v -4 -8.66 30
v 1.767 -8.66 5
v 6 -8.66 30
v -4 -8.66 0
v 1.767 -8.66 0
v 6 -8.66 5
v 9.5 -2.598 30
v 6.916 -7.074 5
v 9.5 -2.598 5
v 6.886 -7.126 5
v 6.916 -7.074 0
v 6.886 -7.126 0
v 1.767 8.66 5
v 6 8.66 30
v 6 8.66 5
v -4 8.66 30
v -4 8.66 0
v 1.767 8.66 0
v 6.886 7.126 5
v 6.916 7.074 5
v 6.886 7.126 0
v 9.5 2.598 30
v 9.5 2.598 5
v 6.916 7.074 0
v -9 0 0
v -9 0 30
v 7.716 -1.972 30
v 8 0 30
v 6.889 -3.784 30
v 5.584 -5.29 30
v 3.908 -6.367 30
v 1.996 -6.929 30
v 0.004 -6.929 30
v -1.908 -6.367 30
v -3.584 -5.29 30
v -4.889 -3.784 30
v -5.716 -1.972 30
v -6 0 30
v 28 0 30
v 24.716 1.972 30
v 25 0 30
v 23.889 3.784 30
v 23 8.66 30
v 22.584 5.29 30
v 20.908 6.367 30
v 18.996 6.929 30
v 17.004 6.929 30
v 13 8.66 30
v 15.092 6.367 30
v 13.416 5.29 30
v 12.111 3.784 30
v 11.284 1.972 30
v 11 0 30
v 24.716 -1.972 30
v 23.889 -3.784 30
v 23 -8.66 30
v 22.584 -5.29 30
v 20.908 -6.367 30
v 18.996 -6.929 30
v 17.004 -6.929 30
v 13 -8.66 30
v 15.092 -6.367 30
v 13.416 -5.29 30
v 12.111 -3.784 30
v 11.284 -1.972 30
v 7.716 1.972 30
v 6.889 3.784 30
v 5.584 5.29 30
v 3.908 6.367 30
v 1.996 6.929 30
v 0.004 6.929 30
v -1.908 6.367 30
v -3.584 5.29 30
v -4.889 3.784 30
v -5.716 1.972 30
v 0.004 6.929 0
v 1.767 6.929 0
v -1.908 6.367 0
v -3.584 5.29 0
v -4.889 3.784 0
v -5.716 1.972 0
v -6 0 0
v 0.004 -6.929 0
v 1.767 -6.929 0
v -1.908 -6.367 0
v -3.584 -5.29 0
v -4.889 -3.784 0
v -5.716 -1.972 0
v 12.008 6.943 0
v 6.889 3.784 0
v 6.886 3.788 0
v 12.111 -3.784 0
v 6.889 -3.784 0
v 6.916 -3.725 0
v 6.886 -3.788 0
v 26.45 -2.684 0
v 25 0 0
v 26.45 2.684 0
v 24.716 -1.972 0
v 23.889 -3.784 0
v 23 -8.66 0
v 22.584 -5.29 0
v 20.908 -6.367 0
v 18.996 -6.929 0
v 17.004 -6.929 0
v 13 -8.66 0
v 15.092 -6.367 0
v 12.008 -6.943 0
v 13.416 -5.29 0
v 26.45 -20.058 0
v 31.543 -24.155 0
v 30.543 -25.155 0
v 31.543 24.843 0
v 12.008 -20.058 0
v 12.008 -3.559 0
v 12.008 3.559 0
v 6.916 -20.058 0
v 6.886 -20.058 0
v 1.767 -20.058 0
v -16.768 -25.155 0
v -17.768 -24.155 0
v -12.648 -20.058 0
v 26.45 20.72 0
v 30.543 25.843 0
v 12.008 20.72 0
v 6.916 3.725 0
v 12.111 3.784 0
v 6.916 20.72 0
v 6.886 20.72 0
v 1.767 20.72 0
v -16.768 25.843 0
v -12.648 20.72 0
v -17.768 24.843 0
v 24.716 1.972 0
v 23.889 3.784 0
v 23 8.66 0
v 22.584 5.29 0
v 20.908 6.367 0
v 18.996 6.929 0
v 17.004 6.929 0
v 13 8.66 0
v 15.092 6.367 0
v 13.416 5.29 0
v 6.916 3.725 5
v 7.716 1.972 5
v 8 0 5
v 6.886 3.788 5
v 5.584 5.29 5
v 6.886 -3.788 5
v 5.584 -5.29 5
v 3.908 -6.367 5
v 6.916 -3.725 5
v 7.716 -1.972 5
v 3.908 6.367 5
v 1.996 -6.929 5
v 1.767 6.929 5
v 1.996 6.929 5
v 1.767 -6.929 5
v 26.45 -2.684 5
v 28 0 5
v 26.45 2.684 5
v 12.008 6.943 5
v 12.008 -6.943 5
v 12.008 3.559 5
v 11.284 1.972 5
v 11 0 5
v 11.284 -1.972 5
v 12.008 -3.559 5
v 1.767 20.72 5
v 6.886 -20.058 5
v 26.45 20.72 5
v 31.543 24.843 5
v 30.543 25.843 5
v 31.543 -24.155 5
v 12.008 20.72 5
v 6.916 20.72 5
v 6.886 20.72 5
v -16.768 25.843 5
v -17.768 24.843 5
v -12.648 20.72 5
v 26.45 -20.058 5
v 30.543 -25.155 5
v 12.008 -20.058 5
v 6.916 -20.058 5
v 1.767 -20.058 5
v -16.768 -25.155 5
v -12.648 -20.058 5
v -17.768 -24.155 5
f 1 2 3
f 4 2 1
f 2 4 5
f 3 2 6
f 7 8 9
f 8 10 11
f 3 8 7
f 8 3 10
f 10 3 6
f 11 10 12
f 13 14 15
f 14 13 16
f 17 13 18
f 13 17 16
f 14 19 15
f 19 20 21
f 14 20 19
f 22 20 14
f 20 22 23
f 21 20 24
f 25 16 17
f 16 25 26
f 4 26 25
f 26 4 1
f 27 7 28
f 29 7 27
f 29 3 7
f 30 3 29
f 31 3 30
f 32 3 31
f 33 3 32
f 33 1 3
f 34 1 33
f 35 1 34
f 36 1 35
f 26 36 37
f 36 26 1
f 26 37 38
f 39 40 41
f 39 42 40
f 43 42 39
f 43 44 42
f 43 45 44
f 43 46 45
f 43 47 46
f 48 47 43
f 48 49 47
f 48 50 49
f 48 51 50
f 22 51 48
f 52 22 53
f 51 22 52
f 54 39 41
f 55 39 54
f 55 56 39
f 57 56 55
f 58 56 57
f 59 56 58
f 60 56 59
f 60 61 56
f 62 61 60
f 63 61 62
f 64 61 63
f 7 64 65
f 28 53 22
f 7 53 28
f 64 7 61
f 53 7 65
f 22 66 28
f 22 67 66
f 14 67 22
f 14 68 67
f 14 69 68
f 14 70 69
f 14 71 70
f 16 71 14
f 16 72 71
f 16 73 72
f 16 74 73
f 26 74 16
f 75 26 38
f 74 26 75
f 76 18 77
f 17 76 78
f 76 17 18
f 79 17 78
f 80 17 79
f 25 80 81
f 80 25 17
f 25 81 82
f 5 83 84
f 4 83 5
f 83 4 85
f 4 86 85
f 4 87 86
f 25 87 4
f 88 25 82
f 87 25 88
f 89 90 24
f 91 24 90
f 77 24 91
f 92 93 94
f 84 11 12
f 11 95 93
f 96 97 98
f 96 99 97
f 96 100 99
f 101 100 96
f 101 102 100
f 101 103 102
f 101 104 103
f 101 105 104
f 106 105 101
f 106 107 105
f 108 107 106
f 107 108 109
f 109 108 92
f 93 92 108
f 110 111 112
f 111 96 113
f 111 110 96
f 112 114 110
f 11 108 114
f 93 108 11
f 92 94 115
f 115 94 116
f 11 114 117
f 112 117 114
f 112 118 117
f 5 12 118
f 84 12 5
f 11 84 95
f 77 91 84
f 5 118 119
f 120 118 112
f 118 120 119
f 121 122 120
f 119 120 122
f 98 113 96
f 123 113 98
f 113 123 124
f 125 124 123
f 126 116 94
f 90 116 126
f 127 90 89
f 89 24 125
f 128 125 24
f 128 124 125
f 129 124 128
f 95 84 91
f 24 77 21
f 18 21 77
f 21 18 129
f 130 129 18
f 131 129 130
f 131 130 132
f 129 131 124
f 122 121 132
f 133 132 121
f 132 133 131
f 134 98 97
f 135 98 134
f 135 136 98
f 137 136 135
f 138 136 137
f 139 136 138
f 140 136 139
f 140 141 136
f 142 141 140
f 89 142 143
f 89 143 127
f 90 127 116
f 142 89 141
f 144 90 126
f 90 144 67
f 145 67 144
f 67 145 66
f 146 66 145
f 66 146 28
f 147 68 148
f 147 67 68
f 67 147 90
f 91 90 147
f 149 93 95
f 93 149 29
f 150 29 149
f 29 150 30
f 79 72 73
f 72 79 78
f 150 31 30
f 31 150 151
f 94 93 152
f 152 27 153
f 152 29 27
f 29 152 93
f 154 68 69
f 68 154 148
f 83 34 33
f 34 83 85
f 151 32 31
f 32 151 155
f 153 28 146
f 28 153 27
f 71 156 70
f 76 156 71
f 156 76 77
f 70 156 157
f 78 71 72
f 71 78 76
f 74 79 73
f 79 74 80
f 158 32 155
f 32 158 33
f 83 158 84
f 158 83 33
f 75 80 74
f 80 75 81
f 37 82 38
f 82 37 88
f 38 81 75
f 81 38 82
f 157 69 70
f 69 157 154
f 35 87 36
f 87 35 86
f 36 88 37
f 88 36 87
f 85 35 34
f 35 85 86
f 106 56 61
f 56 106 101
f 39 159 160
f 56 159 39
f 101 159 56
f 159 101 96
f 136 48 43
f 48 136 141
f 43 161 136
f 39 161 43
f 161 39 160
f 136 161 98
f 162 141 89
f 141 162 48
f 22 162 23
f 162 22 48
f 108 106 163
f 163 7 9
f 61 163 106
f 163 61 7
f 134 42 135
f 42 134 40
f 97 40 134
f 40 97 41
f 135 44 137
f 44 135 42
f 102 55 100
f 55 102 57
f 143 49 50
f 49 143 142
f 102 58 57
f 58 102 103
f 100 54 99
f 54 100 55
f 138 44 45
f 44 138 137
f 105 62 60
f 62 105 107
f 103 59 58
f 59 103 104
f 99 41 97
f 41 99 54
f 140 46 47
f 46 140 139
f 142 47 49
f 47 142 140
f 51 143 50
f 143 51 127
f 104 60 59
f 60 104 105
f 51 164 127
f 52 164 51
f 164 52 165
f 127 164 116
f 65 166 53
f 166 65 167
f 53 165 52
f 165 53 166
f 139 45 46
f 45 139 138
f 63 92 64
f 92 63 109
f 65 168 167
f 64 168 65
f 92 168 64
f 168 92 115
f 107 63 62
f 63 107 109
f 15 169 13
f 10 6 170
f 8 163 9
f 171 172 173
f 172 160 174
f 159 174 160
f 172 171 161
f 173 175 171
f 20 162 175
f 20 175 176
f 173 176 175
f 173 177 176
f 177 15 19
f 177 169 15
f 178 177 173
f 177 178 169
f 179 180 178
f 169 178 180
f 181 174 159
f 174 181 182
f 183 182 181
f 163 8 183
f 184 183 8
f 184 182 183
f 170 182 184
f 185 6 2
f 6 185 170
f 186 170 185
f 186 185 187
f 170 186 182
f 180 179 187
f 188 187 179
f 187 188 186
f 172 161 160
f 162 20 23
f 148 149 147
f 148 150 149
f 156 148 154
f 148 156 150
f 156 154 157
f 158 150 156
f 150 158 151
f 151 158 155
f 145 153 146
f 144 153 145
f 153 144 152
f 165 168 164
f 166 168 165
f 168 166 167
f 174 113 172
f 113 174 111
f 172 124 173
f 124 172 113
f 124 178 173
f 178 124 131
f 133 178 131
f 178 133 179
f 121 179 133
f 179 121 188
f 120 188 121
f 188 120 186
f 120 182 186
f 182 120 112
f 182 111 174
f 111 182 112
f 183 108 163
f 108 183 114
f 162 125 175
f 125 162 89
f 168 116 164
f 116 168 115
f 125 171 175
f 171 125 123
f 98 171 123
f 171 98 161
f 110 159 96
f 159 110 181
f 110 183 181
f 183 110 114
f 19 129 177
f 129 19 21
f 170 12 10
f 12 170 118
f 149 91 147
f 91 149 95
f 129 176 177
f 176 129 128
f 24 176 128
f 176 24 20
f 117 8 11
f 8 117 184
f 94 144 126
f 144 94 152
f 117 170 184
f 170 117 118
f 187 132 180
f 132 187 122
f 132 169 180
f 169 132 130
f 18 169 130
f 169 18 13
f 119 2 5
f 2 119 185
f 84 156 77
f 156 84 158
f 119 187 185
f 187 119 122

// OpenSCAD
translate([1,0,0]){
difference(){
    cylinder(h=30, d=20, $fn=6);
    cylinder(h=30, d=14);    
}
translate([17,0,0]) difference(){
    cylinder(h=30, d=20, $fn=6);
    cylinder(h=30, d=14);    
}
}
linear_extrude(5)
offset(r = 1)
text("真子", font="UD Digi Kyokasho NP\\-R:style=Bold", size=40,spacing=0.6, valign ="center", halign ="center");
